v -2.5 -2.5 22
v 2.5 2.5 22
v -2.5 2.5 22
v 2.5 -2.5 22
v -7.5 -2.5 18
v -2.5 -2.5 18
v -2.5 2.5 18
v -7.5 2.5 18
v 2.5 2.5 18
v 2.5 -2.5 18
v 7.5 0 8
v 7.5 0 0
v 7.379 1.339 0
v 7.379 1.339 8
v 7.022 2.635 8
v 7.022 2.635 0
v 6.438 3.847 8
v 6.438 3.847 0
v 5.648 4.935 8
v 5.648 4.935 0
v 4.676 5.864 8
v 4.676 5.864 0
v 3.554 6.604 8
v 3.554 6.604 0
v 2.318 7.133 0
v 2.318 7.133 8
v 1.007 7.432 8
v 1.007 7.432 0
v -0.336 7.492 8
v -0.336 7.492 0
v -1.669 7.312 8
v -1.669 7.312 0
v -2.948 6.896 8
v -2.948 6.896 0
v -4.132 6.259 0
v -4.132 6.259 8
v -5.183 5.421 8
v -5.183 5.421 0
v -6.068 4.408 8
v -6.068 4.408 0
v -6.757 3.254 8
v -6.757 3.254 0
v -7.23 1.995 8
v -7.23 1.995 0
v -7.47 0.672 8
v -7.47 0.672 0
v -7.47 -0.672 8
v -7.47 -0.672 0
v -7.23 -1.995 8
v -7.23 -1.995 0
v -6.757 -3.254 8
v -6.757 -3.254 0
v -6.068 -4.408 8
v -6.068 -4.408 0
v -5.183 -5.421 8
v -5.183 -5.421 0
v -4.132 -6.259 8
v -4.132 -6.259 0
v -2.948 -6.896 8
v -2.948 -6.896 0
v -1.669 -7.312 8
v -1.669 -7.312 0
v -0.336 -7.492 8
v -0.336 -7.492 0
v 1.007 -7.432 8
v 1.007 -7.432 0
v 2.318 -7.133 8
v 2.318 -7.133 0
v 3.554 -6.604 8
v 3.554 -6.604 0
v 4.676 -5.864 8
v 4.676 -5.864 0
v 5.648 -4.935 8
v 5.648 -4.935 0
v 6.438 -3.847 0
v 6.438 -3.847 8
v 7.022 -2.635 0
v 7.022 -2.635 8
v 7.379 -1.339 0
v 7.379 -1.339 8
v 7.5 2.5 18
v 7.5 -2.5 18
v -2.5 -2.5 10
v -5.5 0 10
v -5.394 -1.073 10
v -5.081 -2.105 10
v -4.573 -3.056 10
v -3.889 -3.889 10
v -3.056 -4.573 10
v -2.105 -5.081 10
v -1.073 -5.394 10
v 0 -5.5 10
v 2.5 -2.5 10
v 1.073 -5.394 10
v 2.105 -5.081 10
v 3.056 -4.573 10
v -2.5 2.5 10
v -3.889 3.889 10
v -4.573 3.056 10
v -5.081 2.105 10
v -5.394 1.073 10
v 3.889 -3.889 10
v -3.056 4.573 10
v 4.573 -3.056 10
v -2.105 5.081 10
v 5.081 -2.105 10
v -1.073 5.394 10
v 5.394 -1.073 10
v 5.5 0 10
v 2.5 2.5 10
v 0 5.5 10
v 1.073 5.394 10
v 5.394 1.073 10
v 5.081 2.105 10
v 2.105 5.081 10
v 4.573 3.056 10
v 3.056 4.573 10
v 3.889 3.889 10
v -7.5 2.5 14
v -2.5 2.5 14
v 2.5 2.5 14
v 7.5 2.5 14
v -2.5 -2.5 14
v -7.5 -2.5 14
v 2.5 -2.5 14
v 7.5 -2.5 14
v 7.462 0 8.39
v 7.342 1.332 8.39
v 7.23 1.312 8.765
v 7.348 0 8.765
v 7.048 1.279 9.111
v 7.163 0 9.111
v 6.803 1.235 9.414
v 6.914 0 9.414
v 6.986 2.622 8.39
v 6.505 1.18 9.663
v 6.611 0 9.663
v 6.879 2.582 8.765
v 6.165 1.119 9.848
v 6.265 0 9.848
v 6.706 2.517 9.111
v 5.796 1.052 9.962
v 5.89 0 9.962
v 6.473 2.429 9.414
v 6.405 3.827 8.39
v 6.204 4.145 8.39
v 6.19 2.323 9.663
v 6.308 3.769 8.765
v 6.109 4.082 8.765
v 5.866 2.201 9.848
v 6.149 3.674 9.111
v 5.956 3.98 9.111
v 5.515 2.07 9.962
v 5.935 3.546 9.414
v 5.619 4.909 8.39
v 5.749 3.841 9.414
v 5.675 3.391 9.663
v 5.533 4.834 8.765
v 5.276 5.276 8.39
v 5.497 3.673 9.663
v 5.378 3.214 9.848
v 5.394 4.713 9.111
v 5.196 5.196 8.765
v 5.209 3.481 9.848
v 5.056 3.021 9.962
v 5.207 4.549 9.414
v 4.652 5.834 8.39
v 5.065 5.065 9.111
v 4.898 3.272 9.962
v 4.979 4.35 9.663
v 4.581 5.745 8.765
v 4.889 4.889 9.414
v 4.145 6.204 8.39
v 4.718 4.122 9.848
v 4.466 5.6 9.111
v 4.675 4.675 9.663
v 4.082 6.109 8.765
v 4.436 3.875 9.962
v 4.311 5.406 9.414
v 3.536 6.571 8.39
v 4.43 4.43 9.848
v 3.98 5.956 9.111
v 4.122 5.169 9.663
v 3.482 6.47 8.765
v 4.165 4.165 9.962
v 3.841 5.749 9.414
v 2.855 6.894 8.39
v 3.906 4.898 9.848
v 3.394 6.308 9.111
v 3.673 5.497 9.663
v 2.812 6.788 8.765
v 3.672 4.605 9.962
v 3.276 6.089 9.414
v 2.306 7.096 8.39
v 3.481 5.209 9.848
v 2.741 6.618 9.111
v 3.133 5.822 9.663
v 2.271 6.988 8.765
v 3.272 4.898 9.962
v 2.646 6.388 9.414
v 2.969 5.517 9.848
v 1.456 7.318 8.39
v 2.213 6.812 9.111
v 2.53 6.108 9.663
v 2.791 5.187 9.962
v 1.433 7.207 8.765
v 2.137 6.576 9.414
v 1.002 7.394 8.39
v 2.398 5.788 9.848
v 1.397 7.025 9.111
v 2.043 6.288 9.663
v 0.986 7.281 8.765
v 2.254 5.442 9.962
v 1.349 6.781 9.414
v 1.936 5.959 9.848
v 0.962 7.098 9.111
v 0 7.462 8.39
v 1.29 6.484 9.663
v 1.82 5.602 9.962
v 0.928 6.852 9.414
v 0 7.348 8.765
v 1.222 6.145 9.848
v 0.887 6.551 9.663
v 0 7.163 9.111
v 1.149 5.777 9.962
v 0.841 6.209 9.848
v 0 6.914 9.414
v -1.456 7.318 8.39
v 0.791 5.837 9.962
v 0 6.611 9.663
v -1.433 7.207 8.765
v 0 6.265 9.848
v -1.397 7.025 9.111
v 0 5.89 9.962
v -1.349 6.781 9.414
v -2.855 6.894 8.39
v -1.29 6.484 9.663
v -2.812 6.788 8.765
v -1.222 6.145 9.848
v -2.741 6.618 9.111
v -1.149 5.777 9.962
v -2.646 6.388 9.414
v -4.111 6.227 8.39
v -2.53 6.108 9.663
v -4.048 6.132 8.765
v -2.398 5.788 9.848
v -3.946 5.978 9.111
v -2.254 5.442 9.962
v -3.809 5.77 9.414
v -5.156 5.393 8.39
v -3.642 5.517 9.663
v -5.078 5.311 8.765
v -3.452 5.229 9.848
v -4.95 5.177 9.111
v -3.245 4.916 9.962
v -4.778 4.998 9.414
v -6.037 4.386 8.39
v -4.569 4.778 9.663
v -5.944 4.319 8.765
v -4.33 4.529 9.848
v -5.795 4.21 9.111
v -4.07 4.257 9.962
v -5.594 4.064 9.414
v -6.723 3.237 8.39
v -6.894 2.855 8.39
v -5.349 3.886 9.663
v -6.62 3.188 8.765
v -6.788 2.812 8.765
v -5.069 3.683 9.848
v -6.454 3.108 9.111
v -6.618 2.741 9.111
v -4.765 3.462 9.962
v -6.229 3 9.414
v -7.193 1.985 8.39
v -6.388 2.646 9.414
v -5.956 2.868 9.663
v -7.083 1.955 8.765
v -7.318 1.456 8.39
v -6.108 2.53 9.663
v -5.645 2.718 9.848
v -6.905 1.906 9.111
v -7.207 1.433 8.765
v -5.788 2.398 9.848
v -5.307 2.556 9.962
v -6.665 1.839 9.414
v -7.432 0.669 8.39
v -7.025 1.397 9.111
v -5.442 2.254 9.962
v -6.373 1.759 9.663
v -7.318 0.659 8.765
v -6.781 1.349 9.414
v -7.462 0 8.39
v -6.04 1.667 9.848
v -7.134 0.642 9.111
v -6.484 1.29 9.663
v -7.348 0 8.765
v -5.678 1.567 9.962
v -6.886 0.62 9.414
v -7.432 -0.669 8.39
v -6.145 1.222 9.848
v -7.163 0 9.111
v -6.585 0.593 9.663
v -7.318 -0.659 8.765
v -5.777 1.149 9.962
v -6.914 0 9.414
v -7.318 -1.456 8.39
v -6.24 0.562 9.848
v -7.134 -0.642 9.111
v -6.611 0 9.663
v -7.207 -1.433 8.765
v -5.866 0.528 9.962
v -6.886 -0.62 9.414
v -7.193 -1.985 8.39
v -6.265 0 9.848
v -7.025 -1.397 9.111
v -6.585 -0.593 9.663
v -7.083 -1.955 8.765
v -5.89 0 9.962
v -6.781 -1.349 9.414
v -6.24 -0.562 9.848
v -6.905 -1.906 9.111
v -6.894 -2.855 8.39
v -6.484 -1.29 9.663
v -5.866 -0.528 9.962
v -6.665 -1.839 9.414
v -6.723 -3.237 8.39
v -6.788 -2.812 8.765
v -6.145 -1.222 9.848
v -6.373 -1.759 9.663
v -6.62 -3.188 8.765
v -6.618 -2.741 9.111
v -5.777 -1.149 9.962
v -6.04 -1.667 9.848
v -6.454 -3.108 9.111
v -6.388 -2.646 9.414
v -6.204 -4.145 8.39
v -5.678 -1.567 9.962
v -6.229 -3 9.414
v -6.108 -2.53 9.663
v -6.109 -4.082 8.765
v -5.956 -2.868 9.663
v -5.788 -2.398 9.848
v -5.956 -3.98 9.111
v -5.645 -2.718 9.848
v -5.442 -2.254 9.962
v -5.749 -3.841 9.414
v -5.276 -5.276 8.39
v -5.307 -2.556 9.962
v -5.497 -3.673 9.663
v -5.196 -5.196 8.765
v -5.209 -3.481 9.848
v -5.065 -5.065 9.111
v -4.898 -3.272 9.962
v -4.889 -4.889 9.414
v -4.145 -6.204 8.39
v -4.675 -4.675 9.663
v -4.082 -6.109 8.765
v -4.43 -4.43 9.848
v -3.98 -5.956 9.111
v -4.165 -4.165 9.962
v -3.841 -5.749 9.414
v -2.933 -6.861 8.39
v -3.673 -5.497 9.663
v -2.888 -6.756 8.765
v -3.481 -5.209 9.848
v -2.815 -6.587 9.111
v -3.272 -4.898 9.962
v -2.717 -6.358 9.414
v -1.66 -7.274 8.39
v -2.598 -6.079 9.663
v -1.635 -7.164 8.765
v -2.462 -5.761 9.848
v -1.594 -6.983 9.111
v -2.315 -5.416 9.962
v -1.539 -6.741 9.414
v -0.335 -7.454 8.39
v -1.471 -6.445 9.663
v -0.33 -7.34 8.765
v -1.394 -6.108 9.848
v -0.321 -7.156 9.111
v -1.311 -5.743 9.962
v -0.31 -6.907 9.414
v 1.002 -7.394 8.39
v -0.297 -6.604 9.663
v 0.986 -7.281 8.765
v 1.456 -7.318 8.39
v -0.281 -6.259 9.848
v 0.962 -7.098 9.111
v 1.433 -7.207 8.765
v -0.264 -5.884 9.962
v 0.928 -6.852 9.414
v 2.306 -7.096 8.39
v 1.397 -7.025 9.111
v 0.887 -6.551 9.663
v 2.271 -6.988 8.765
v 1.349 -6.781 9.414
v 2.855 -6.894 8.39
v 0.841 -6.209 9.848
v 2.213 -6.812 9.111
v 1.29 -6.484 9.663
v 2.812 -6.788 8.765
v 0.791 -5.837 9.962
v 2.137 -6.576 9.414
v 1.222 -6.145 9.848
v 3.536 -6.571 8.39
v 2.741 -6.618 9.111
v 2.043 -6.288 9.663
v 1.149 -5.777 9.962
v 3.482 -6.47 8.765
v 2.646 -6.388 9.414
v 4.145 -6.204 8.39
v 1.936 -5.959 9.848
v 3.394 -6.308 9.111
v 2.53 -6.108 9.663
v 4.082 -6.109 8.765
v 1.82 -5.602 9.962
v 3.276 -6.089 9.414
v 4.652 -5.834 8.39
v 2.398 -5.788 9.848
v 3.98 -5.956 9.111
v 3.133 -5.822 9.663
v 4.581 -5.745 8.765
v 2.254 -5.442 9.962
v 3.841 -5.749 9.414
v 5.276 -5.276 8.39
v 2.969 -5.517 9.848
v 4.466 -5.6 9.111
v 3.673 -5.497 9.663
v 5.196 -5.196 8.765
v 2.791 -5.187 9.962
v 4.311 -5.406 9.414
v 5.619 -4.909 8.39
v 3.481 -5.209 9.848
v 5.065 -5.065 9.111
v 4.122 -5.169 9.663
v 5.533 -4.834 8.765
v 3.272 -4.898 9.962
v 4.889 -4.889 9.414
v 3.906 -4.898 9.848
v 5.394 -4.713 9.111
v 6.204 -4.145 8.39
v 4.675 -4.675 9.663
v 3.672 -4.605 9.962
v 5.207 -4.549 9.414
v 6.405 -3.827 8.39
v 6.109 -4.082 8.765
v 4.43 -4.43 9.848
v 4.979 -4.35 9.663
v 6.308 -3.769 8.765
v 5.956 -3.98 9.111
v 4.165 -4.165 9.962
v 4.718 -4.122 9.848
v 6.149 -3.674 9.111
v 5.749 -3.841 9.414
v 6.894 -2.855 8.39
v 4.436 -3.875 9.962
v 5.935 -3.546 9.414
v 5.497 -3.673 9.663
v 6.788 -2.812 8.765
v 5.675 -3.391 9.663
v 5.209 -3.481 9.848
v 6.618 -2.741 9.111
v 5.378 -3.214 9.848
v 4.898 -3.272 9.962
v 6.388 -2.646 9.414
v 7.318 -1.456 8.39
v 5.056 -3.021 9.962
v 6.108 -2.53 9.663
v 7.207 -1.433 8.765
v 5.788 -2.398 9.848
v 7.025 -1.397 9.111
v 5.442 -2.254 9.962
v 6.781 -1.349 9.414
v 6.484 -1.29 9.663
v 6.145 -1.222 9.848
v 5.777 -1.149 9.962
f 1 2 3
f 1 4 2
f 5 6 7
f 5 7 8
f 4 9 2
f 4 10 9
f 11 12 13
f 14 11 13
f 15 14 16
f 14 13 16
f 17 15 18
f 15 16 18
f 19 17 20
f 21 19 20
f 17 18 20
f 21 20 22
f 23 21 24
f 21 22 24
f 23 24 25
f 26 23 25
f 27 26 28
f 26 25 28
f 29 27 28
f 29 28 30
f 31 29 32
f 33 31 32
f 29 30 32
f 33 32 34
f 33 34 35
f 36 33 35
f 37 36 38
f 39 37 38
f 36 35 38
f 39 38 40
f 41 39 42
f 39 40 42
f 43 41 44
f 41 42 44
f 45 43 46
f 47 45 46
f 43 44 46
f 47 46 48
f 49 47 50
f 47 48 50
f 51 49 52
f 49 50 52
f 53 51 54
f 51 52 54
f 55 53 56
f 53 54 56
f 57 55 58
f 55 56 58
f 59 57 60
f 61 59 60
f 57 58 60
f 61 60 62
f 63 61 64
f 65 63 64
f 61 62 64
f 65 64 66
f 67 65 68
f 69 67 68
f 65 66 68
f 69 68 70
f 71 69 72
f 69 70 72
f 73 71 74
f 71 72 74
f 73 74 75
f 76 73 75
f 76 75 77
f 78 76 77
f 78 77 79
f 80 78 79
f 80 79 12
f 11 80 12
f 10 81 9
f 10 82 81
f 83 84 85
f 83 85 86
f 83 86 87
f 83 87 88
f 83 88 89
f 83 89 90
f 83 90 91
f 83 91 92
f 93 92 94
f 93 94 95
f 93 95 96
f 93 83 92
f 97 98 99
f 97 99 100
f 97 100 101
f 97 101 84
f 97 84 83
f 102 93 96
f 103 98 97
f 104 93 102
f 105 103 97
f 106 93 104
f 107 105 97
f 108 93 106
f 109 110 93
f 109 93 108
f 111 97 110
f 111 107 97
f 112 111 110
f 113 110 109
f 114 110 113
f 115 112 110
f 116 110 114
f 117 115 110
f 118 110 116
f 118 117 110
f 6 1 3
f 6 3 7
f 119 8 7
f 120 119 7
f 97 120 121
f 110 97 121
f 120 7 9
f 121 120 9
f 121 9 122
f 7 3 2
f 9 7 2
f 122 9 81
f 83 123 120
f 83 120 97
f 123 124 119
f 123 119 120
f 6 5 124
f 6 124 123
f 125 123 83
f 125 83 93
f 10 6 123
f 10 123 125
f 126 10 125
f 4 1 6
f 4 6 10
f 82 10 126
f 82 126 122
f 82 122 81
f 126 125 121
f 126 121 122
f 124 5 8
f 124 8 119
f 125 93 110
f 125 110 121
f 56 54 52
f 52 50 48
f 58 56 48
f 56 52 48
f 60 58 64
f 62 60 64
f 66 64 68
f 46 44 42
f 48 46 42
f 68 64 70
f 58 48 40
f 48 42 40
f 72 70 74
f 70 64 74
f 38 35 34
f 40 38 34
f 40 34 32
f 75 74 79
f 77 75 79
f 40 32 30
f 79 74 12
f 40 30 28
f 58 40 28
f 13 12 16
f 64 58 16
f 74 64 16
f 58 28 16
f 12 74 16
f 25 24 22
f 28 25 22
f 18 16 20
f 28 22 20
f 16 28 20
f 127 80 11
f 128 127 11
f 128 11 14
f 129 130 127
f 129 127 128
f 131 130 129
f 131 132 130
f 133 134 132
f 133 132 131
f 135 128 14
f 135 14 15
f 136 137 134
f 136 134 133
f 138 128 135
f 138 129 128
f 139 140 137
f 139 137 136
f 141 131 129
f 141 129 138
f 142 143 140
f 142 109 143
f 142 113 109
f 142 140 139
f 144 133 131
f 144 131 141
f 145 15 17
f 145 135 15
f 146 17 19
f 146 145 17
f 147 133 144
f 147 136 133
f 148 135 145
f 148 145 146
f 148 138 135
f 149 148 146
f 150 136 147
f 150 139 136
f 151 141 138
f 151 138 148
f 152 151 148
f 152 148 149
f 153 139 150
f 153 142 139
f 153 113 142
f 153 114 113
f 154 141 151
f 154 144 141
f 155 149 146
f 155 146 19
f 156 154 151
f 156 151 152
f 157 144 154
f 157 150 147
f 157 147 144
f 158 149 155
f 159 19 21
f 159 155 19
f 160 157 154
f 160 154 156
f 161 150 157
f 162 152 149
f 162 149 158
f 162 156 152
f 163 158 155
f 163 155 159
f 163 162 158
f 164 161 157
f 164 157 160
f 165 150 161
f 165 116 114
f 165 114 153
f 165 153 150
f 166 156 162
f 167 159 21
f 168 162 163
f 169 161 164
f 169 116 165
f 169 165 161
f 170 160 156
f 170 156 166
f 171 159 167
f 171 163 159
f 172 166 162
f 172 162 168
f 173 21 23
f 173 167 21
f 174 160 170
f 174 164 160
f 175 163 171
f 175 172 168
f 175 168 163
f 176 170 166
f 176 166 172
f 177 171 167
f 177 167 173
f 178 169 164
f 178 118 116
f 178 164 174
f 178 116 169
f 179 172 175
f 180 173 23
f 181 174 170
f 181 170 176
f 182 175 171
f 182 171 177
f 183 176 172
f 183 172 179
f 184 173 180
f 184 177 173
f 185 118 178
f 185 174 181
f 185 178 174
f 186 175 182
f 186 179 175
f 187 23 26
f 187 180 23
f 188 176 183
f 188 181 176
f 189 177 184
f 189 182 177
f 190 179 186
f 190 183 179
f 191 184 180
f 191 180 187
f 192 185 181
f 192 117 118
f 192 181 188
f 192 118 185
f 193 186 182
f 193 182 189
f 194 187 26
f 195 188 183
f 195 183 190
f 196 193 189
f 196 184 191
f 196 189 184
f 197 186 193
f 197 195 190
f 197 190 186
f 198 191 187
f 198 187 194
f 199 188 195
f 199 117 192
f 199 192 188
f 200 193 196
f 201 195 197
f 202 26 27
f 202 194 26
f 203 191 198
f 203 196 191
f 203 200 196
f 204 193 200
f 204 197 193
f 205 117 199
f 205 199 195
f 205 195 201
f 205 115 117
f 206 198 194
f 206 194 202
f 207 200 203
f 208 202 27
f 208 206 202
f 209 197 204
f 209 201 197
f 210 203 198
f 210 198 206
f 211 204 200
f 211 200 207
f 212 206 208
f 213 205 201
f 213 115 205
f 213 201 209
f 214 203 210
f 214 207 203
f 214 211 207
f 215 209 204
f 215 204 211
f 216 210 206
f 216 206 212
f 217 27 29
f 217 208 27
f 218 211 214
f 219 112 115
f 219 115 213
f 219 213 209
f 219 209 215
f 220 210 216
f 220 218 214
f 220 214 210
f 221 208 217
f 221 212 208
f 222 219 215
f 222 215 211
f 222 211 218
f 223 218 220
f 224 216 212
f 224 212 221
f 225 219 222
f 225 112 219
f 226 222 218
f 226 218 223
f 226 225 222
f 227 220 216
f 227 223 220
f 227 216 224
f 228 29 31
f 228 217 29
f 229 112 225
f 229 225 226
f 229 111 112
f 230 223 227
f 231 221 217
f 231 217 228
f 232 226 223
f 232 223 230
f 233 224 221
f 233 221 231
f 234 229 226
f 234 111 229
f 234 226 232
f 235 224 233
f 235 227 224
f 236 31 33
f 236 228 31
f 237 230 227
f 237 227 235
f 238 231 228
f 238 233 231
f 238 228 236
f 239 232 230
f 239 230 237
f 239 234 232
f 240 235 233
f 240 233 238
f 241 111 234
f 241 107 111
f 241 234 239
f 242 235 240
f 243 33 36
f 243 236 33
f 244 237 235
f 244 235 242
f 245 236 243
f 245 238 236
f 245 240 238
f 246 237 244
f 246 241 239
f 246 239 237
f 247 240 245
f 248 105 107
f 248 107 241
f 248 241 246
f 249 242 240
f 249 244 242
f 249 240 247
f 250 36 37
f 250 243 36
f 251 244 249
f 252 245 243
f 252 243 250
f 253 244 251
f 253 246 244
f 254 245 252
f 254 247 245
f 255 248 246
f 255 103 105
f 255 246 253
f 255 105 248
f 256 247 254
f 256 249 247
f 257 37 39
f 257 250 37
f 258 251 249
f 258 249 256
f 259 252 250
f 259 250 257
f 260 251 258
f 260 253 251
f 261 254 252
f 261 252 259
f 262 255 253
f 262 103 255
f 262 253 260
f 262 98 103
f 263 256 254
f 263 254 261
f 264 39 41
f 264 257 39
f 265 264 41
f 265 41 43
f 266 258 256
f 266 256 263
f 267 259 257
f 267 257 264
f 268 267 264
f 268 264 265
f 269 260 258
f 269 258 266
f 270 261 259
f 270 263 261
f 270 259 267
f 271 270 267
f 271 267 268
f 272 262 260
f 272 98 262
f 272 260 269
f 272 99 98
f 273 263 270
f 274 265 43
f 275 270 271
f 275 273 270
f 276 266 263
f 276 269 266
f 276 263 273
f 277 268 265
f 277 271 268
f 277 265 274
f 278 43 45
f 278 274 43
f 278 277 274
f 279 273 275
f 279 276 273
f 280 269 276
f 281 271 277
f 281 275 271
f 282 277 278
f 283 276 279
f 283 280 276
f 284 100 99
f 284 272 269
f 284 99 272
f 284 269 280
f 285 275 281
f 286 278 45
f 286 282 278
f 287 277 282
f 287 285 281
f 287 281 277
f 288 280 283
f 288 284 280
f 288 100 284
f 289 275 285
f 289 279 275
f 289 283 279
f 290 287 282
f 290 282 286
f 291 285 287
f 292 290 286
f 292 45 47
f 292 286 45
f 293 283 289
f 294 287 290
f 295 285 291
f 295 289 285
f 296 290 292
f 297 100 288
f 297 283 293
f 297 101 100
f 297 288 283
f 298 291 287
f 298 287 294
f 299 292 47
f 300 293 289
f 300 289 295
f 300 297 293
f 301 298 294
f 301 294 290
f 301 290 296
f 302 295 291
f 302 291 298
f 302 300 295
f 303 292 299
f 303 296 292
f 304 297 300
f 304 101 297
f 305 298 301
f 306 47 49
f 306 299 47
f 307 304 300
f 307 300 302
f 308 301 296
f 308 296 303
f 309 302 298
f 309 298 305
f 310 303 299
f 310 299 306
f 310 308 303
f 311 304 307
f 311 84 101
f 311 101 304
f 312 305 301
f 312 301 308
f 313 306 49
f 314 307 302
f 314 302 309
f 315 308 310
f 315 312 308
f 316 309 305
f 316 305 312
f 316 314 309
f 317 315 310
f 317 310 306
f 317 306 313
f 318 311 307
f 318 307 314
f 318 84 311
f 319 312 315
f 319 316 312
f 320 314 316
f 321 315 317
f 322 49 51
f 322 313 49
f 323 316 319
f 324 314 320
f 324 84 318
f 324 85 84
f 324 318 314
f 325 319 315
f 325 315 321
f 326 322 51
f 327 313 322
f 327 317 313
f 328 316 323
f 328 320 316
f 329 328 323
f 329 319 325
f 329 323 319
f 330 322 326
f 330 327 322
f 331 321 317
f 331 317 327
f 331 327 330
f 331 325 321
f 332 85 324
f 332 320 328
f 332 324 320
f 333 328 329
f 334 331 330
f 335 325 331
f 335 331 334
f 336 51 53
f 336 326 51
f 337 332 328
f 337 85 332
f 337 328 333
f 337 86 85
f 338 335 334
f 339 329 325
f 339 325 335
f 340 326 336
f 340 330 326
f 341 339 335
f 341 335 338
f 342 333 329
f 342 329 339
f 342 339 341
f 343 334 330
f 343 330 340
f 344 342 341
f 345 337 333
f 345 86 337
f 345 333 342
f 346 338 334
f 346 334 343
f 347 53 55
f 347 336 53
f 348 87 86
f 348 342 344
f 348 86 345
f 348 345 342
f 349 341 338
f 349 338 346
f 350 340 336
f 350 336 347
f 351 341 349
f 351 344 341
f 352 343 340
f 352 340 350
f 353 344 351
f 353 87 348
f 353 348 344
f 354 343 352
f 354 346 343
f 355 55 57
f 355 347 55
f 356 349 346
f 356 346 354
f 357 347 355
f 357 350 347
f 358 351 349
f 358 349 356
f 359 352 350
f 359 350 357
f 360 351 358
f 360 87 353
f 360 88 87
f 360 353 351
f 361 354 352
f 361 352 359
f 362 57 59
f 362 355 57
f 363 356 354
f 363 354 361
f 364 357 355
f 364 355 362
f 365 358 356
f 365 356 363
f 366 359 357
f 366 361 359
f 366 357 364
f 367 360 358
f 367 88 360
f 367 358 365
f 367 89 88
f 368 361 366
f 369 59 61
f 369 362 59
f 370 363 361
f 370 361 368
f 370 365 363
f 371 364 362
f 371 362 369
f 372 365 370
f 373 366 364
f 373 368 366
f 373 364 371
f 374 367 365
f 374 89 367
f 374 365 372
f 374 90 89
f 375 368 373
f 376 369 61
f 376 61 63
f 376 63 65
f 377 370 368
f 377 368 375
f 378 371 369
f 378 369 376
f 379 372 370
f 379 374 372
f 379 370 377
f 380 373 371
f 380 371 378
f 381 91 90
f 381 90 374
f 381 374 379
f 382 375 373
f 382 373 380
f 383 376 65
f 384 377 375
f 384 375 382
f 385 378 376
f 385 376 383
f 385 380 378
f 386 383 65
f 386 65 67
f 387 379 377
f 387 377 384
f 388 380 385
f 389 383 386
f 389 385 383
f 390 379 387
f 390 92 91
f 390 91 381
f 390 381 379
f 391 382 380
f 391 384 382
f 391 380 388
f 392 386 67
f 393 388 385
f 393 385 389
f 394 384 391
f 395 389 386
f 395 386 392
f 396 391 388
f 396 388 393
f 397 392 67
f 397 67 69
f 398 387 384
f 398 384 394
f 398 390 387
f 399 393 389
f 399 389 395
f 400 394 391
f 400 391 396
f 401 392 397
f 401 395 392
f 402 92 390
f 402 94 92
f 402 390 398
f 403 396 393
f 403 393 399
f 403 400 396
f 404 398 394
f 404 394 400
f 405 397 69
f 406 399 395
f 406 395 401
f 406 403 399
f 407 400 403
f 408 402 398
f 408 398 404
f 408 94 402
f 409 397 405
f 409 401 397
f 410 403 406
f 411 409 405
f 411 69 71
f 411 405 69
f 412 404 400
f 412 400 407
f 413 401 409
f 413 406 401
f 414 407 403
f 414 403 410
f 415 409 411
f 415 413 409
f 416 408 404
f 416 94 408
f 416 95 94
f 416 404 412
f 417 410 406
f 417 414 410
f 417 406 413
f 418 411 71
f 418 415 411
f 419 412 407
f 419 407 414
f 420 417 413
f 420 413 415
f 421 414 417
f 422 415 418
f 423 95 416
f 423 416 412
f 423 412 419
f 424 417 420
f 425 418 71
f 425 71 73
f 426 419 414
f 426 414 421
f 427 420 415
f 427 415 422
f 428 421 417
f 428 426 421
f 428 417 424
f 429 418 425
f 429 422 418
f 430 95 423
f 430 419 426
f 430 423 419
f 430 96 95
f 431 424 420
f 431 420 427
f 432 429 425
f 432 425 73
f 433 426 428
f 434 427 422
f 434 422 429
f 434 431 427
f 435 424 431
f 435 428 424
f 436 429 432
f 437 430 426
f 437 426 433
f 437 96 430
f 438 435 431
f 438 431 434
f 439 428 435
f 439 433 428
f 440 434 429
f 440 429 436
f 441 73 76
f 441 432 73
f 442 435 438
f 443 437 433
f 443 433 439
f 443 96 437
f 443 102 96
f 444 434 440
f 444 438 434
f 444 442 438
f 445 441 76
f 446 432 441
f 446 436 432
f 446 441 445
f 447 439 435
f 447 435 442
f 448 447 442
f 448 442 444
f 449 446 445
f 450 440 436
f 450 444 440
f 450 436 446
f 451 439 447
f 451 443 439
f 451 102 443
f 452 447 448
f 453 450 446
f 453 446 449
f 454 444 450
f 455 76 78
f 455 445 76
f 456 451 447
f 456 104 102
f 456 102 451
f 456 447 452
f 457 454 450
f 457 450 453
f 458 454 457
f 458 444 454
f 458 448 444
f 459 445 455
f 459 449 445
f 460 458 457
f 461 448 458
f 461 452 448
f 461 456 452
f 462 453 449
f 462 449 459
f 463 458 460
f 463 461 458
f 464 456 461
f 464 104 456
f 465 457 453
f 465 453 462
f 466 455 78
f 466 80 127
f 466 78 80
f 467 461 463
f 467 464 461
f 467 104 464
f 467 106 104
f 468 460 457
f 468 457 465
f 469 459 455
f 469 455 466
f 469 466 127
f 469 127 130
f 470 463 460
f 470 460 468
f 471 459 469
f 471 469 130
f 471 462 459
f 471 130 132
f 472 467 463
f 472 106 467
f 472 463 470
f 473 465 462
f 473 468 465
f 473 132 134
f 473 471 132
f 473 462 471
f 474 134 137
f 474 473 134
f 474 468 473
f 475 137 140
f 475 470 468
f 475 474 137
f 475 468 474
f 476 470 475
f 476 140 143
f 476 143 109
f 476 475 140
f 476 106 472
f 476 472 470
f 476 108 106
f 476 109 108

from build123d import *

# Parameters (mm, degrees)
F0_R     = 7.5
F1_DEPTH = 10
F3_DEPTH = 2.5
F4_R     = 2


with BuildPart() as f1:
    # F0 (on Top) → F1 (new body)
    with BuildSketch(Plane.XY):
        Circle(F0_R)
    extrude(amount=F1_DEPTH)

    # F2 (on Front) → F3 (join, symmetric)
    with BuildSketch(Plane.XZ):
        Polygon((2.5, 22), (-2.5, 22), (-2.5, 18), (-7.5, 18), (-7.5, 14), (-2.5, 14), (-2.5, 10), (2.5, 10), (2.5, 14), (7.5, 14), (7.5, 18), (2.5, 18), align=None)
    extrude(amount=F3_DEPTH, both=True)

    # F4
    f4_edges = [f1.edges().sort_by_distance(p)[0] for p in [
        (-7.5, 0, 10),
    ]]
    fillet(f4_edges, radius=F4_R)


solid = f1.part
